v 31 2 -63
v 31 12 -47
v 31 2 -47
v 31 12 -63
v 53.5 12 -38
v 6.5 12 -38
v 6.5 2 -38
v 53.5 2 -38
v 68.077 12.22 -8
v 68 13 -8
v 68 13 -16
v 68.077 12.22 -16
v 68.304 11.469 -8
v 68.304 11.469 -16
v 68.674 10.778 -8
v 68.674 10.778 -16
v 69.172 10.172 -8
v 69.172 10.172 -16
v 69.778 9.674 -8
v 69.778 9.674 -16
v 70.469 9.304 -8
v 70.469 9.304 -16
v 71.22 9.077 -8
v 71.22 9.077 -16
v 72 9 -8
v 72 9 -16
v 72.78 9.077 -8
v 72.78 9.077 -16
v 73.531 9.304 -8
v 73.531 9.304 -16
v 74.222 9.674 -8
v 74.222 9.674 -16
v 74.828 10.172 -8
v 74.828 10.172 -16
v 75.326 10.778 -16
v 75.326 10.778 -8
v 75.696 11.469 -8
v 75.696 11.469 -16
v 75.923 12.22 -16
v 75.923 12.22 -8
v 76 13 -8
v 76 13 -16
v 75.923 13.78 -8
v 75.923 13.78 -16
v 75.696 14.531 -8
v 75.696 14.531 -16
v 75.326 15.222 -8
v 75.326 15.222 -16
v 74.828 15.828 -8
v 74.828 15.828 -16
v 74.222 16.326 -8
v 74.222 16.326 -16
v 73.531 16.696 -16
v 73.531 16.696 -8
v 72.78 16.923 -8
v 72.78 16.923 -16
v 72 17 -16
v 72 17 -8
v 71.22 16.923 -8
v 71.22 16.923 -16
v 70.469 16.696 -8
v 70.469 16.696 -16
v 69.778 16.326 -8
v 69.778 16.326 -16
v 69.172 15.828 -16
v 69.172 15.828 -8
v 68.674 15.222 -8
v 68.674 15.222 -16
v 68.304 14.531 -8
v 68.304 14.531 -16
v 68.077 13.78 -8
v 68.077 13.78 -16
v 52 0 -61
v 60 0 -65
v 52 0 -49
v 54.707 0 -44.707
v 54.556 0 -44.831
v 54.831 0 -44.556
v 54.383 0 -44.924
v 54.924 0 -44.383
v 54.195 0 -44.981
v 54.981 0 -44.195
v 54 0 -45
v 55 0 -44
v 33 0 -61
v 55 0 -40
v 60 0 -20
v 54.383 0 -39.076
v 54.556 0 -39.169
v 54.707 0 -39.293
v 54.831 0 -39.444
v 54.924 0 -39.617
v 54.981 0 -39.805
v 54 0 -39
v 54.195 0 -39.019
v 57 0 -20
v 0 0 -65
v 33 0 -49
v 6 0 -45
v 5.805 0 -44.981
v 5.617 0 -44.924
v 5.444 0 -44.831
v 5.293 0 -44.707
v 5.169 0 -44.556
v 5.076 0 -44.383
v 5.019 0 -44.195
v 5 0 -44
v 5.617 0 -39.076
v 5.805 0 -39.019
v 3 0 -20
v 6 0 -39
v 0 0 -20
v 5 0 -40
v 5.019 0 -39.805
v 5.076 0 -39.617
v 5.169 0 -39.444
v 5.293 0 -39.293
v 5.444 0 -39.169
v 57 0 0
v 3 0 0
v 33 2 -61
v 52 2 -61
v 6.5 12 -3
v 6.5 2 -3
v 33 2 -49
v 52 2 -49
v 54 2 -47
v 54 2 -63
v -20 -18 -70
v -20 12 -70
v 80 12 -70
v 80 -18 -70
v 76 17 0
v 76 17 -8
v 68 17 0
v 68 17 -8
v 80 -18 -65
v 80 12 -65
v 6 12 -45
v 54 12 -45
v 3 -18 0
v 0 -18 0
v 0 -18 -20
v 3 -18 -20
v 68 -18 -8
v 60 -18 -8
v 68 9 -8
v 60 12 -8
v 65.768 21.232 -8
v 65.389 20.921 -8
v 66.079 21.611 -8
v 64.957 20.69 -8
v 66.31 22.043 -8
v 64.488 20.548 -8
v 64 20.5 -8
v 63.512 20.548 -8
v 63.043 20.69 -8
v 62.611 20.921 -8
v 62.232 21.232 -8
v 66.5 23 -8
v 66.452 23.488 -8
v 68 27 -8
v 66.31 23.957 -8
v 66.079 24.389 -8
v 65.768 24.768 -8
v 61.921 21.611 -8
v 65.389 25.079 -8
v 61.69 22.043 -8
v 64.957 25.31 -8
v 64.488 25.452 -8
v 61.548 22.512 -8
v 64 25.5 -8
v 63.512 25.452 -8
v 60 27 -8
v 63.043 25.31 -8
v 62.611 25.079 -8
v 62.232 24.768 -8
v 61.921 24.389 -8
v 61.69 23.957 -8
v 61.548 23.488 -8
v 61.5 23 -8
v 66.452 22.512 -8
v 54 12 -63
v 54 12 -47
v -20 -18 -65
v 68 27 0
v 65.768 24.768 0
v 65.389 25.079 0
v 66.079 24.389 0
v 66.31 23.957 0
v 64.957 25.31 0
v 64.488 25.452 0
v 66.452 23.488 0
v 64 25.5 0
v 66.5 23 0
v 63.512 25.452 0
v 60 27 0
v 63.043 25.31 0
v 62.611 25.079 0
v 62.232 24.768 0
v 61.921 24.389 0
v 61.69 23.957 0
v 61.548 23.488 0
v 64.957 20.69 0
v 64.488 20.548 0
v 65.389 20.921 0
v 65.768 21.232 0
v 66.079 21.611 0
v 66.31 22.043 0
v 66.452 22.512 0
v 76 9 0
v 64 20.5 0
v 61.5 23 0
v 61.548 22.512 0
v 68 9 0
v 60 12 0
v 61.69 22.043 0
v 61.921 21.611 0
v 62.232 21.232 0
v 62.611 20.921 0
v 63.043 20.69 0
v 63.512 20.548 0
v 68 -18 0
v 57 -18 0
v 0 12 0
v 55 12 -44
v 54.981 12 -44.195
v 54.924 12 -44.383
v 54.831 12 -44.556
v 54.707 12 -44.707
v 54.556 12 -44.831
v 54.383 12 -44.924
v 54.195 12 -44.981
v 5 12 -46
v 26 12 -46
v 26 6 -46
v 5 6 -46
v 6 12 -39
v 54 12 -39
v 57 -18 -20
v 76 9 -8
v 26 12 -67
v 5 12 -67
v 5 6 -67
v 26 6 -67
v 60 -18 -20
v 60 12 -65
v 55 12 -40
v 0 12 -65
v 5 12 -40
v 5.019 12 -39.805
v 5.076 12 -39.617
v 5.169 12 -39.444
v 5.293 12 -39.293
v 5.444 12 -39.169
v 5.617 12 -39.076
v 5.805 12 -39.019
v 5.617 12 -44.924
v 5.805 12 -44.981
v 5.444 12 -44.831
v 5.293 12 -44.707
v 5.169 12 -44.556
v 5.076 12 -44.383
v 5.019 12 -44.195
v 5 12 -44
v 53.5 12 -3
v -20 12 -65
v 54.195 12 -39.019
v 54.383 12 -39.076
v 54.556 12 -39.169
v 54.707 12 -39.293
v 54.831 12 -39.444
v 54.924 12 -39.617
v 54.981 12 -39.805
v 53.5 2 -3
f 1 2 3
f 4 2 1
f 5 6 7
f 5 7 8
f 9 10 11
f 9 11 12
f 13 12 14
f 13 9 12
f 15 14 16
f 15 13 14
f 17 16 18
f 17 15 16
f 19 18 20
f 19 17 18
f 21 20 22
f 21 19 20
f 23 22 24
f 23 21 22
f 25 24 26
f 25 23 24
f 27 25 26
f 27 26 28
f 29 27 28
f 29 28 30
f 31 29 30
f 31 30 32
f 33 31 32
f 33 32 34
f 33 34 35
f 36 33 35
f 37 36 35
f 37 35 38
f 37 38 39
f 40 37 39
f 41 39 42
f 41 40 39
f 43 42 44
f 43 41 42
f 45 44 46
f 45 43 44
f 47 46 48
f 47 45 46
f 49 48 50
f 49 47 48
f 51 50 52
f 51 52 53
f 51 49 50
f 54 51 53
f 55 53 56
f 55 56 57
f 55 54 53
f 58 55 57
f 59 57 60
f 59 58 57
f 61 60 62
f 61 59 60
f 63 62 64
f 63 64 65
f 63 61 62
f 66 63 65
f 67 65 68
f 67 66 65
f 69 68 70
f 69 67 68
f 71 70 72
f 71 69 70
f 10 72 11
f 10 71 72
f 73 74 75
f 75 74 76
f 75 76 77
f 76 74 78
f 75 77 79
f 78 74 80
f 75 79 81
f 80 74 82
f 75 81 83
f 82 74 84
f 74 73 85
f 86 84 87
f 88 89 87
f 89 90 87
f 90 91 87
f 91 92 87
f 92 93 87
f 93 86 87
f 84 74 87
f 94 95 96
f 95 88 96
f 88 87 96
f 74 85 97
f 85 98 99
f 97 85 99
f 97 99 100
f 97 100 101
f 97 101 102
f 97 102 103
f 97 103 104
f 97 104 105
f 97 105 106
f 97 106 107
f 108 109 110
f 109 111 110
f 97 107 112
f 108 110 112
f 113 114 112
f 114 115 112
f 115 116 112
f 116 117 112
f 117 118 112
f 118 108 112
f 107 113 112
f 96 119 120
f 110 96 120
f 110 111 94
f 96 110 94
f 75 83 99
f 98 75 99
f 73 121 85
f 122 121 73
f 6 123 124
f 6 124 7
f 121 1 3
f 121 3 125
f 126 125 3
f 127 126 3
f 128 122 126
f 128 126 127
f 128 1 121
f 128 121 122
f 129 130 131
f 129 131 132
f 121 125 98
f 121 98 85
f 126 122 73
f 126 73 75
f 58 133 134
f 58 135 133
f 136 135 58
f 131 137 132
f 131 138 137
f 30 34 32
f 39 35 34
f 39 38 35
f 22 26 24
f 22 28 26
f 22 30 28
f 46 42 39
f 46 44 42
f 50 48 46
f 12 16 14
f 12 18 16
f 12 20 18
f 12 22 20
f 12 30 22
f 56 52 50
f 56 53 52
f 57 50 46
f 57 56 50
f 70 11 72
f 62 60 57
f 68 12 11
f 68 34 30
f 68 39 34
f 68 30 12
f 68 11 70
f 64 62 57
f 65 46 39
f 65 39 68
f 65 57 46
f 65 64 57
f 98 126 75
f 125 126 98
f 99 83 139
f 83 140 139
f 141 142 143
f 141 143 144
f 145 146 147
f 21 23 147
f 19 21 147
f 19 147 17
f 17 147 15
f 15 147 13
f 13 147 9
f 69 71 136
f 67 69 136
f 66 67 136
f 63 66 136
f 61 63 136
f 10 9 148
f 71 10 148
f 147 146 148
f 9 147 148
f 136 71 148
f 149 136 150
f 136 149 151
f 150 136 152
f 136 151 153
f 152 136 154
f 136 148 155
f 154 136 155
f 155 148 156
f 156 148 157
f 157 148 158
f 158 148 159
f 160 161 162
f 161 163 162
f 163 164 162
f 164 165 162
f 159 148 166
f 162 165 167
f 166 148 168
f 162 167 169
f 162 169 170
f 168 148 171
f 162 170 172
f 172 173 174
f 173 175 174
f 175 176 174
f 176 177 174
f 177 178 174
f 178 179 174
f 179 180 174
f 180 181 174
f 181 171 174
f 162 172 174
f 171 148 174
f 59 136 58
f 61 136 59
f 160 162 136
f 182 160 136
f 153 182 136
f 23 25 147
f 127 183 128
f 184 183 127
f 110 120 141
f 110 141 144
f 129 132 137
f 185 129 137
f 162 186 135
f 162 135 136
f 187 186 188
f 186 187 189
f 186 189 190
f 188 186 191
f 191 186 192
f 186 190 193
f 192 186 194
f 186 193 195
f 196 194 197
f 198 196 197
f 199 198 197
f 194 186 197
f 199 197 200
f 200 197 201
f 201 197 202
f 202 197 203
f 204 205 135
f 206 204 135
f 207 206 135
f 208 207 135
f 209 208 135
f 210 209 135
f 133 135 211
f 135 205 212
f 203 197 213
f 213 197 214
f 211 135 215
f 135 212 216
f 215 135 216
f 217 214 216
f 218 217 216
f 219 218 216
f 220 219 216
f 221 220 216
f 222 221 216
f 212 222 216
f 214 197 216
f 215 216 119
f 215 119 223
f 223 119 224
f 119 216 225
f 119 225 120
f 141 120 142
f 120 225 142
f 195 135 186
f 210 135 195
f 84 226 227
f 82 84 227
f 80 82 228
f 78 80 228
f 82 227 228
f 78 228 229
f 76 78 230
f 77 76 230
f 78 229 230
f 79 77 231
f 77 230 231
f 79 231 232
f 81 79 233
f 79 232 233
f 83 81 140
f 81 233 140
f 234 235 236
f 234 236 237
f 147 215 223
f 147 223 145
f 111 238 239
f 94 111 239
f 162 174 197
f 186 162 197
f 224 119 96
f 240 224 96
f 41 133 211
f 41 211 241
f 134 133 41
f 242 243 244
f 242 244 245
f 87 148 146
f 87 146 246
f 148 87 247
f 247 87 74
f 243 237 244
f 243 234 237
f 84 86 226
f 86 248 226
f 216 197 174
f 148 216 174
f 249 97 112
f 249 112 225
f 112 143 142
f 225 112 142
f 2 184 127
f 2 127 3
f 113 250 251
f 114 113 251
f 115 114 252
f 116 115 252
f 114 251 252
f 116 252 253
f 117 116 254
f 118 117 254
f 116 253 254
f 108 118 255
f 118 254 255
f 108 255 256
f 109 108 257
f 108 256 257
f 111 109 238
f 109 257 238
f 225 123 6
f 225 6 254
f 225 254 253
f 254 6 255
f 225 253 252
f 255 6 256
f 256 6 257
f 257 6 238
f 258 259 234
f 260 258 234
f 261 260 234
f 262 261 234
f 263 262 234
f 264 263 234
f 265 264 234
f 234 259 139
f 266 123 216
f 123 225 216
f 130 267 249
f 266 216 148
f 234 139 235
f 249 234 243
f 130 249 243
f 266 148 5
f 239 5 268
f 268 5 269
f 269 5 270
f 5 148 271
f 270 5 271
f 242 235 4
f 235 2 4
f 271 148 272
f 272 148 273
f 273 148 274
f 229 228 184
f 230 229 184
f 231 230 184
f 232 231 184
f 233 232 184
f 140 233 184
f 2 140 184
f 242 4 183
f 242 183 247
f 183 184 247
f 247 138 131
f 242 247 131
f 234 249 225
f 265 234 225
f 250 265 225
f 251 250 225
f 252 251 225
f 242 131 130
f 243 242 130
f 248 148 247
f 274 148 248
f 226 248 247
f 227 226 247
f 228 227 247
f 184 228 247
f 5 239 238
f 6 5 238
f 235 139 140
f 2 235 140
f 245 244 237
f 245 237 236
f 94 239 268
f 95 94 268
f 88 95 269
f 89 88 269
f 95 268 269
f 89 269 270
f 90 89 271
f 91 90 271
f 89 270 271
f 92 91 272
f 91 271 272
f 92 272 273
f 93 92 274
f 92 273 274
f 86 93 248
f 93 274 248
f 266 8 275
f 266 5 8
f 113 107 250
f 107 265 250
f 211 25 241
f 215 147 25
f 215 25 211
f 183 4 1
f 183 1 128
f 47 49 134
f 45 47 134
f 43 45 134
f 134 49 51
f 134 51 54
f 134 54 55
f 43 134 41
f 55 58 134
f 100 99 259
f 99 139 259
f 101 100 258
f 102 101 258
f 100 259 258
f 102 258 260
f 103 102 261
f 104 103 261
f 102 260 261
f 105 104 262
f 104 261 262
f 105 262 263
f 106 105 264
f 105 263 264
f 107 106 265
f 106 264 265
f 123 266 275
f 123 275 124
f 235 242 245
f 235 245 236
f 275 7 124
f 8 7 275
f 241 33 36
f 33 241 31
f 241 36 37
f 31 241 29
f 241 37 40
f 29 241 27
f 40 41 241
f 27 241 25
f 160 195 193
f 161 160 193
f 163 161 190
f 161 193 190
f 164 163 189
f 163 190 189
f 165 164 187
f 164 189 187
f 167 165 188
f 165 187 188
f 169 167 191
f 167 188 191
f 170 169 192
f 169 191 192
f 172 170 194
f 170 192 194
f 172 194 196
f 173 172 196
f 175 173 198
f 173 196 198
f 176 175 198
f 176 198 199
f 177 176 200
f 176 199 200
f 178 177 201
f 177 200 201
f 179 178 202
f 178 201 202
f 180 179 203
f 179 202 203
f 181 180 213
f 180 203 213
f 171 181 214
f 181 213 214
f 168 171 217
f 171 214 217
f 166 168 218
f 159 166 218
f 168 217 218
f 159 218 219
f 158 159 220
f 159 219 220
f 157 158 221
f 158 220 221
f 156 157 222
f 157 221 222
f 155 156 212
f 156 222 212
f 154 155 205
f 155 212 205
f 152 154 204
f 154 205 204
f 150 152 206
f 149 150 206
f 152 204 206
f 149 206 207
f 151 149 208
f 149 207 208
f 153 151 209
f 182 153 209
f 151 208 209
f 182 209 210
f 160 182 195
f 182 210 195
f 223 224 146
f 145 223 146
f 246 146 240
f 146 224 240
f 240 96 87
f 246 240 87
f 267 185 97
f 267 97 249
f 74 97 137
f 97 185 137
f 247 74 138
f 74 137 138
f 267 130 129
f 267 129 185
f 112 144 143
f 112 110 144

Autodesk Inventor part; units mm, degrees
ref_plane "YZ Plane" through (0, 0, 0) normal (1, 0, 0) x (0, 1, 0)
ref_plane "XZ Plane" through (0, 0, 0) normal (0, 1, 0) x (-1, 0, 0)
sketch "Sketch1" plane through (0, 0, 0) normal (0, 1, 0) x (-1, 0, 0)
  line L0 (0, 0) -> (-60, 0)
  line L1 (-60, 0) -> (-60, -70)
  line L2 (-60, -70) -> (0, -70)
  line L3 (0, -70) -> (0, 0)
  dimension "d0" = 60
  dimension "d1" = 70
extrude "Extrusion1" add sketch "Sketch1" along normal blind 12
sketch "Sketch2" plane through (0, 0, 0) normal (0, -1, 0) x (1, 0, 0)
  line L0 (60, -70) -> (0, -70) projected
  line L1 (60, 0) -> (60, -70) projected
  line L2 (0, -70) -> (60, -70)
  line L3 (60, -70) -> (60, -65)
  line L4 (60, -65) -> (0, -65)
  line L5 (0, -65) -> (0, -70)
  line L6 (60, 0) -> (57, 0)
  line L7 (57, 0) -> (57, -20)
  line L8 (57, -20) -> (60, -20)
  line L9 (60, -20) -> (60, 0)
  line L10 (0, -70) -> (0, 0) projected
  line L11 (0, 0) -> (3, 0)
  line L12 (3, 0) -> (3, -20)
  line L13 (3, -20) -> (0, -20)
  line L14 (0, -20) -> (0, 0)
  point P0 (0, -20)
  dimension "d4" = 5
  dimension "d9" = 3
  dimension "d10" = 20
  dimension "d11" = 3
  dimension "d12" = 20
extrude "Extrusion2" add sketch "Sketch2" along normal blind 18
sketch "Sketch3" plane through (60, 0, 0) normal (1, 0, 0) x (0, 0, -1)
  line L0 (65, 0) -> (65, -18) projected
  line L1 (70, -18) -> (70, 12) projected
  line L2 (65, -18) -> (70, -18)
  line L3 (70, -18) -> (70, 12)
  line L4 (70, 12) -> (65, 12)
  line L5 (65, 12) -> (65, -18)
  point P0 (0, 0)
extrude "Extrusion3" add sketch "Sketch3" along normal blind 20
ref_plane "Work Plane1" through (30, 0, 0) normal (1, 0, 0) x (0, 0, -1)
mirror "Mirror1" about plane through (30, 0, 0) normal (1, 0, 0) of "Extrusion3"
sketch "Sketch4" plane through (0, 12, 0) normal (0, 1, 0) x (1, 0, 0)
  line L0 (6.5, 38) -> (53.5, 38)
  line L1 (53.5, 38) -> (53.5, 3)
  line L2 (53.5, 3) -> (6.5, 3)
  line L3 (6.5, 3) -> (6.5, 38)
  line L4 (5, 67) -> (26, 67)
  line L5 (26, 67) -> (26, 46)
  line L6 (26, 46) -> (5, 46)
  line L7 (5, 46) -> (5, 67)
  line L8 (31, 63) -> (54, 63)
  line L9 (54, 63) -> (54, 47)
  line L10 (54, 47) -> (31, 47)
  line L11 (31, 47) -> (31, 63)
  line L12 (0, 0) -> (60, 0) projected
  line L13 (-20, 70) -> (80, 70) projected
  line L14 (0, 65) -> (0, 0) projected
  line L15 (60, 0) -> (60, 65) projected
  point P0 (30, 38)
  point P1 (30, 0)
  dimension "d13" = 47
  dimension "d14" = 35
  dimension "d15" = 21
  dimension "d16" = 21
  dimension "d17" = 23
  dimension "d18" = 16
  dimension "d19" = 3
  dimension "d20" = 7
  dimension "d21" = 3
  dimension "d30" = 5
  dimension "d31" = 6
sketch "Sketch5" plane through (0, 12, 0) normal (0, 1, 0) x (1, 0, 0)
  line L0 (54, 45) -> (6, 45)
  line L1 (5, 44) -> (5, 40)
  line L2 (6, 39) -> (54, 39)
  line L3 (55, 40) -> (55, 44)
  line L4 (26, 46) -> (5, 46) projected
  line L5 (-20, 70) -> (80, 70) projected
  line L6 (0, 65) -> (0, 0) projected
  arc A0 (54, 39) -> (55, 40) centre (54, 40) ccw
  arc A1 (55, 44) -> (54, 45) centre (54, 44) ccw
  arc A2 (6, 45) -> (5, 44) centre (6, 44) ccw
  arc A3 (5, 40) -> (6, 39) centre (6, 40) ccw
  point P0 (55, 45)
  point P1 (5, 39)
  point P2 (55, 39)
  dimension "d22" = 50
  dimension "d23" = 25
  dimension "d24" = 6
  dimension "d25" = 5
  dimension "d26" = 1
  dimension "d27" = 1
extrude "Extrusion4" cut sketch "Sketch5" against normal blind 25
extrude "Extrusion5" cut sketch "Sketch4" against normal blind 10
sketch "Sketch6" plane through (0, 2, 0) normal (0, 1, 0) x (1, 0, 0)
  line L0 (54, 47) -> (31, 47) projected
  line L1 (54, 63) -> (54, 47) projected
  line L2 (31, 63) -> (54, 63) projected
  line L3 (31, 47) -> (31, 63) projected
  line L4 (33, 61) -> (52, 61)
  line L5 (52, 61) -> (52, 49)
  line L6 (52, 49) -> (33, 49)
  line L7 (33, 49) -> (33, 61)
  point P0 (0, 0)
  dimension "d34" = 2
extrude "Extrusion6" cut sketch "Sketch6" against normal blind 12 contours L4 L5 L6 L7
sketch "Sketch7" plane through (0, 2, 0) normal (0, 1, 0) x (1, 0, 0)
  point P0 (0, 0)
sketch "Sketch8" plane through (0, 2, 0) normal (0, 1, 0) x (1, 0, 0)
  line L0 (26, 46) -> (5, 46) projected
  line L1 (26, 67) -> (26, 46) projected
  line L2 (5, 67) -> (26, 67) projected
  line L3 (5, 46) -> (5, 67) projected
  point P0 (0, 0)
extrude "Extrusion7" add sketch "Sketch8" along normal blind 4
sketch "Sketch9" plane through (60, 0, -20) normal (1, 0, 0) x (0, 0, -1)
  line L0 (-20, 12) -> (-20, -18) projected
  line L1 (-20, -18) -> (-12, -18)
  line L2 (-12, -18) -> (-12, 27)
  line L3 (-12, 27) -> (-20, 27)
  line L4 (-20, 27) -> (-20, -18)
  point P0 (-20, 0)
  dimension "d39" = 8
  dimension "d40" = 45
extrude "Extrusion8" add sketch "Sketch9" along normal blind 8
sketch "Sketch10" plane through (3, 0, 0) normal (0, 0, 1) x (1, 0, 0)
  circle A0 centre (61, 23) radius 2.5
  line L0 (57, 27) -> (65, 27) projected
  point P0 (-3, 0)
  point P1 (61, 27)
  dimension "d43" = 5
  dimension "d44" = 4
extrude "Extrusion9" cut sketch "Sketch10" against normal blind 10
sketch "Sketch12" plane through (68, 0, -20) normal (1, 0, 0) x (0, 0, -1)
  line L0 (-20, 27) -> (-20, -18) projected
  line L1 (-12, 12) -> (-12, -18) projected
  line L2 (-20, 17) -> (-12, 17)
  line L3 (-12, 17) -> (-12, 9)
  line L4 (-12, 9) -> (-20, 9)
  line L5 (-20, 9) -> (-20, 17)
  line L6 (-12, 27) -> (-20, 27) projected
  point P0 (-20, 0)
  dimension "d47" = 10
  dimension "d48" = 8
extrude "Extrusion10" add sketch "Sketch12" along normal blind 8
sketch "Sketch13" plane through (60, 12, -8) normal (0, 0, -1) x (-1, 0, 0)
  circle A0 centre (-12, 1) radius 4
  line L0 (-8, 5) -> (-16, 5) projected
  line L1 (-16, -3) -> (-16, 5) projected
  point P0 (60, -12)
  dimension "d51" = 8
extrude "Extrusion11" add sketch "Sketch13" along normal blind 8 contours A0
properties part number "Platform"
